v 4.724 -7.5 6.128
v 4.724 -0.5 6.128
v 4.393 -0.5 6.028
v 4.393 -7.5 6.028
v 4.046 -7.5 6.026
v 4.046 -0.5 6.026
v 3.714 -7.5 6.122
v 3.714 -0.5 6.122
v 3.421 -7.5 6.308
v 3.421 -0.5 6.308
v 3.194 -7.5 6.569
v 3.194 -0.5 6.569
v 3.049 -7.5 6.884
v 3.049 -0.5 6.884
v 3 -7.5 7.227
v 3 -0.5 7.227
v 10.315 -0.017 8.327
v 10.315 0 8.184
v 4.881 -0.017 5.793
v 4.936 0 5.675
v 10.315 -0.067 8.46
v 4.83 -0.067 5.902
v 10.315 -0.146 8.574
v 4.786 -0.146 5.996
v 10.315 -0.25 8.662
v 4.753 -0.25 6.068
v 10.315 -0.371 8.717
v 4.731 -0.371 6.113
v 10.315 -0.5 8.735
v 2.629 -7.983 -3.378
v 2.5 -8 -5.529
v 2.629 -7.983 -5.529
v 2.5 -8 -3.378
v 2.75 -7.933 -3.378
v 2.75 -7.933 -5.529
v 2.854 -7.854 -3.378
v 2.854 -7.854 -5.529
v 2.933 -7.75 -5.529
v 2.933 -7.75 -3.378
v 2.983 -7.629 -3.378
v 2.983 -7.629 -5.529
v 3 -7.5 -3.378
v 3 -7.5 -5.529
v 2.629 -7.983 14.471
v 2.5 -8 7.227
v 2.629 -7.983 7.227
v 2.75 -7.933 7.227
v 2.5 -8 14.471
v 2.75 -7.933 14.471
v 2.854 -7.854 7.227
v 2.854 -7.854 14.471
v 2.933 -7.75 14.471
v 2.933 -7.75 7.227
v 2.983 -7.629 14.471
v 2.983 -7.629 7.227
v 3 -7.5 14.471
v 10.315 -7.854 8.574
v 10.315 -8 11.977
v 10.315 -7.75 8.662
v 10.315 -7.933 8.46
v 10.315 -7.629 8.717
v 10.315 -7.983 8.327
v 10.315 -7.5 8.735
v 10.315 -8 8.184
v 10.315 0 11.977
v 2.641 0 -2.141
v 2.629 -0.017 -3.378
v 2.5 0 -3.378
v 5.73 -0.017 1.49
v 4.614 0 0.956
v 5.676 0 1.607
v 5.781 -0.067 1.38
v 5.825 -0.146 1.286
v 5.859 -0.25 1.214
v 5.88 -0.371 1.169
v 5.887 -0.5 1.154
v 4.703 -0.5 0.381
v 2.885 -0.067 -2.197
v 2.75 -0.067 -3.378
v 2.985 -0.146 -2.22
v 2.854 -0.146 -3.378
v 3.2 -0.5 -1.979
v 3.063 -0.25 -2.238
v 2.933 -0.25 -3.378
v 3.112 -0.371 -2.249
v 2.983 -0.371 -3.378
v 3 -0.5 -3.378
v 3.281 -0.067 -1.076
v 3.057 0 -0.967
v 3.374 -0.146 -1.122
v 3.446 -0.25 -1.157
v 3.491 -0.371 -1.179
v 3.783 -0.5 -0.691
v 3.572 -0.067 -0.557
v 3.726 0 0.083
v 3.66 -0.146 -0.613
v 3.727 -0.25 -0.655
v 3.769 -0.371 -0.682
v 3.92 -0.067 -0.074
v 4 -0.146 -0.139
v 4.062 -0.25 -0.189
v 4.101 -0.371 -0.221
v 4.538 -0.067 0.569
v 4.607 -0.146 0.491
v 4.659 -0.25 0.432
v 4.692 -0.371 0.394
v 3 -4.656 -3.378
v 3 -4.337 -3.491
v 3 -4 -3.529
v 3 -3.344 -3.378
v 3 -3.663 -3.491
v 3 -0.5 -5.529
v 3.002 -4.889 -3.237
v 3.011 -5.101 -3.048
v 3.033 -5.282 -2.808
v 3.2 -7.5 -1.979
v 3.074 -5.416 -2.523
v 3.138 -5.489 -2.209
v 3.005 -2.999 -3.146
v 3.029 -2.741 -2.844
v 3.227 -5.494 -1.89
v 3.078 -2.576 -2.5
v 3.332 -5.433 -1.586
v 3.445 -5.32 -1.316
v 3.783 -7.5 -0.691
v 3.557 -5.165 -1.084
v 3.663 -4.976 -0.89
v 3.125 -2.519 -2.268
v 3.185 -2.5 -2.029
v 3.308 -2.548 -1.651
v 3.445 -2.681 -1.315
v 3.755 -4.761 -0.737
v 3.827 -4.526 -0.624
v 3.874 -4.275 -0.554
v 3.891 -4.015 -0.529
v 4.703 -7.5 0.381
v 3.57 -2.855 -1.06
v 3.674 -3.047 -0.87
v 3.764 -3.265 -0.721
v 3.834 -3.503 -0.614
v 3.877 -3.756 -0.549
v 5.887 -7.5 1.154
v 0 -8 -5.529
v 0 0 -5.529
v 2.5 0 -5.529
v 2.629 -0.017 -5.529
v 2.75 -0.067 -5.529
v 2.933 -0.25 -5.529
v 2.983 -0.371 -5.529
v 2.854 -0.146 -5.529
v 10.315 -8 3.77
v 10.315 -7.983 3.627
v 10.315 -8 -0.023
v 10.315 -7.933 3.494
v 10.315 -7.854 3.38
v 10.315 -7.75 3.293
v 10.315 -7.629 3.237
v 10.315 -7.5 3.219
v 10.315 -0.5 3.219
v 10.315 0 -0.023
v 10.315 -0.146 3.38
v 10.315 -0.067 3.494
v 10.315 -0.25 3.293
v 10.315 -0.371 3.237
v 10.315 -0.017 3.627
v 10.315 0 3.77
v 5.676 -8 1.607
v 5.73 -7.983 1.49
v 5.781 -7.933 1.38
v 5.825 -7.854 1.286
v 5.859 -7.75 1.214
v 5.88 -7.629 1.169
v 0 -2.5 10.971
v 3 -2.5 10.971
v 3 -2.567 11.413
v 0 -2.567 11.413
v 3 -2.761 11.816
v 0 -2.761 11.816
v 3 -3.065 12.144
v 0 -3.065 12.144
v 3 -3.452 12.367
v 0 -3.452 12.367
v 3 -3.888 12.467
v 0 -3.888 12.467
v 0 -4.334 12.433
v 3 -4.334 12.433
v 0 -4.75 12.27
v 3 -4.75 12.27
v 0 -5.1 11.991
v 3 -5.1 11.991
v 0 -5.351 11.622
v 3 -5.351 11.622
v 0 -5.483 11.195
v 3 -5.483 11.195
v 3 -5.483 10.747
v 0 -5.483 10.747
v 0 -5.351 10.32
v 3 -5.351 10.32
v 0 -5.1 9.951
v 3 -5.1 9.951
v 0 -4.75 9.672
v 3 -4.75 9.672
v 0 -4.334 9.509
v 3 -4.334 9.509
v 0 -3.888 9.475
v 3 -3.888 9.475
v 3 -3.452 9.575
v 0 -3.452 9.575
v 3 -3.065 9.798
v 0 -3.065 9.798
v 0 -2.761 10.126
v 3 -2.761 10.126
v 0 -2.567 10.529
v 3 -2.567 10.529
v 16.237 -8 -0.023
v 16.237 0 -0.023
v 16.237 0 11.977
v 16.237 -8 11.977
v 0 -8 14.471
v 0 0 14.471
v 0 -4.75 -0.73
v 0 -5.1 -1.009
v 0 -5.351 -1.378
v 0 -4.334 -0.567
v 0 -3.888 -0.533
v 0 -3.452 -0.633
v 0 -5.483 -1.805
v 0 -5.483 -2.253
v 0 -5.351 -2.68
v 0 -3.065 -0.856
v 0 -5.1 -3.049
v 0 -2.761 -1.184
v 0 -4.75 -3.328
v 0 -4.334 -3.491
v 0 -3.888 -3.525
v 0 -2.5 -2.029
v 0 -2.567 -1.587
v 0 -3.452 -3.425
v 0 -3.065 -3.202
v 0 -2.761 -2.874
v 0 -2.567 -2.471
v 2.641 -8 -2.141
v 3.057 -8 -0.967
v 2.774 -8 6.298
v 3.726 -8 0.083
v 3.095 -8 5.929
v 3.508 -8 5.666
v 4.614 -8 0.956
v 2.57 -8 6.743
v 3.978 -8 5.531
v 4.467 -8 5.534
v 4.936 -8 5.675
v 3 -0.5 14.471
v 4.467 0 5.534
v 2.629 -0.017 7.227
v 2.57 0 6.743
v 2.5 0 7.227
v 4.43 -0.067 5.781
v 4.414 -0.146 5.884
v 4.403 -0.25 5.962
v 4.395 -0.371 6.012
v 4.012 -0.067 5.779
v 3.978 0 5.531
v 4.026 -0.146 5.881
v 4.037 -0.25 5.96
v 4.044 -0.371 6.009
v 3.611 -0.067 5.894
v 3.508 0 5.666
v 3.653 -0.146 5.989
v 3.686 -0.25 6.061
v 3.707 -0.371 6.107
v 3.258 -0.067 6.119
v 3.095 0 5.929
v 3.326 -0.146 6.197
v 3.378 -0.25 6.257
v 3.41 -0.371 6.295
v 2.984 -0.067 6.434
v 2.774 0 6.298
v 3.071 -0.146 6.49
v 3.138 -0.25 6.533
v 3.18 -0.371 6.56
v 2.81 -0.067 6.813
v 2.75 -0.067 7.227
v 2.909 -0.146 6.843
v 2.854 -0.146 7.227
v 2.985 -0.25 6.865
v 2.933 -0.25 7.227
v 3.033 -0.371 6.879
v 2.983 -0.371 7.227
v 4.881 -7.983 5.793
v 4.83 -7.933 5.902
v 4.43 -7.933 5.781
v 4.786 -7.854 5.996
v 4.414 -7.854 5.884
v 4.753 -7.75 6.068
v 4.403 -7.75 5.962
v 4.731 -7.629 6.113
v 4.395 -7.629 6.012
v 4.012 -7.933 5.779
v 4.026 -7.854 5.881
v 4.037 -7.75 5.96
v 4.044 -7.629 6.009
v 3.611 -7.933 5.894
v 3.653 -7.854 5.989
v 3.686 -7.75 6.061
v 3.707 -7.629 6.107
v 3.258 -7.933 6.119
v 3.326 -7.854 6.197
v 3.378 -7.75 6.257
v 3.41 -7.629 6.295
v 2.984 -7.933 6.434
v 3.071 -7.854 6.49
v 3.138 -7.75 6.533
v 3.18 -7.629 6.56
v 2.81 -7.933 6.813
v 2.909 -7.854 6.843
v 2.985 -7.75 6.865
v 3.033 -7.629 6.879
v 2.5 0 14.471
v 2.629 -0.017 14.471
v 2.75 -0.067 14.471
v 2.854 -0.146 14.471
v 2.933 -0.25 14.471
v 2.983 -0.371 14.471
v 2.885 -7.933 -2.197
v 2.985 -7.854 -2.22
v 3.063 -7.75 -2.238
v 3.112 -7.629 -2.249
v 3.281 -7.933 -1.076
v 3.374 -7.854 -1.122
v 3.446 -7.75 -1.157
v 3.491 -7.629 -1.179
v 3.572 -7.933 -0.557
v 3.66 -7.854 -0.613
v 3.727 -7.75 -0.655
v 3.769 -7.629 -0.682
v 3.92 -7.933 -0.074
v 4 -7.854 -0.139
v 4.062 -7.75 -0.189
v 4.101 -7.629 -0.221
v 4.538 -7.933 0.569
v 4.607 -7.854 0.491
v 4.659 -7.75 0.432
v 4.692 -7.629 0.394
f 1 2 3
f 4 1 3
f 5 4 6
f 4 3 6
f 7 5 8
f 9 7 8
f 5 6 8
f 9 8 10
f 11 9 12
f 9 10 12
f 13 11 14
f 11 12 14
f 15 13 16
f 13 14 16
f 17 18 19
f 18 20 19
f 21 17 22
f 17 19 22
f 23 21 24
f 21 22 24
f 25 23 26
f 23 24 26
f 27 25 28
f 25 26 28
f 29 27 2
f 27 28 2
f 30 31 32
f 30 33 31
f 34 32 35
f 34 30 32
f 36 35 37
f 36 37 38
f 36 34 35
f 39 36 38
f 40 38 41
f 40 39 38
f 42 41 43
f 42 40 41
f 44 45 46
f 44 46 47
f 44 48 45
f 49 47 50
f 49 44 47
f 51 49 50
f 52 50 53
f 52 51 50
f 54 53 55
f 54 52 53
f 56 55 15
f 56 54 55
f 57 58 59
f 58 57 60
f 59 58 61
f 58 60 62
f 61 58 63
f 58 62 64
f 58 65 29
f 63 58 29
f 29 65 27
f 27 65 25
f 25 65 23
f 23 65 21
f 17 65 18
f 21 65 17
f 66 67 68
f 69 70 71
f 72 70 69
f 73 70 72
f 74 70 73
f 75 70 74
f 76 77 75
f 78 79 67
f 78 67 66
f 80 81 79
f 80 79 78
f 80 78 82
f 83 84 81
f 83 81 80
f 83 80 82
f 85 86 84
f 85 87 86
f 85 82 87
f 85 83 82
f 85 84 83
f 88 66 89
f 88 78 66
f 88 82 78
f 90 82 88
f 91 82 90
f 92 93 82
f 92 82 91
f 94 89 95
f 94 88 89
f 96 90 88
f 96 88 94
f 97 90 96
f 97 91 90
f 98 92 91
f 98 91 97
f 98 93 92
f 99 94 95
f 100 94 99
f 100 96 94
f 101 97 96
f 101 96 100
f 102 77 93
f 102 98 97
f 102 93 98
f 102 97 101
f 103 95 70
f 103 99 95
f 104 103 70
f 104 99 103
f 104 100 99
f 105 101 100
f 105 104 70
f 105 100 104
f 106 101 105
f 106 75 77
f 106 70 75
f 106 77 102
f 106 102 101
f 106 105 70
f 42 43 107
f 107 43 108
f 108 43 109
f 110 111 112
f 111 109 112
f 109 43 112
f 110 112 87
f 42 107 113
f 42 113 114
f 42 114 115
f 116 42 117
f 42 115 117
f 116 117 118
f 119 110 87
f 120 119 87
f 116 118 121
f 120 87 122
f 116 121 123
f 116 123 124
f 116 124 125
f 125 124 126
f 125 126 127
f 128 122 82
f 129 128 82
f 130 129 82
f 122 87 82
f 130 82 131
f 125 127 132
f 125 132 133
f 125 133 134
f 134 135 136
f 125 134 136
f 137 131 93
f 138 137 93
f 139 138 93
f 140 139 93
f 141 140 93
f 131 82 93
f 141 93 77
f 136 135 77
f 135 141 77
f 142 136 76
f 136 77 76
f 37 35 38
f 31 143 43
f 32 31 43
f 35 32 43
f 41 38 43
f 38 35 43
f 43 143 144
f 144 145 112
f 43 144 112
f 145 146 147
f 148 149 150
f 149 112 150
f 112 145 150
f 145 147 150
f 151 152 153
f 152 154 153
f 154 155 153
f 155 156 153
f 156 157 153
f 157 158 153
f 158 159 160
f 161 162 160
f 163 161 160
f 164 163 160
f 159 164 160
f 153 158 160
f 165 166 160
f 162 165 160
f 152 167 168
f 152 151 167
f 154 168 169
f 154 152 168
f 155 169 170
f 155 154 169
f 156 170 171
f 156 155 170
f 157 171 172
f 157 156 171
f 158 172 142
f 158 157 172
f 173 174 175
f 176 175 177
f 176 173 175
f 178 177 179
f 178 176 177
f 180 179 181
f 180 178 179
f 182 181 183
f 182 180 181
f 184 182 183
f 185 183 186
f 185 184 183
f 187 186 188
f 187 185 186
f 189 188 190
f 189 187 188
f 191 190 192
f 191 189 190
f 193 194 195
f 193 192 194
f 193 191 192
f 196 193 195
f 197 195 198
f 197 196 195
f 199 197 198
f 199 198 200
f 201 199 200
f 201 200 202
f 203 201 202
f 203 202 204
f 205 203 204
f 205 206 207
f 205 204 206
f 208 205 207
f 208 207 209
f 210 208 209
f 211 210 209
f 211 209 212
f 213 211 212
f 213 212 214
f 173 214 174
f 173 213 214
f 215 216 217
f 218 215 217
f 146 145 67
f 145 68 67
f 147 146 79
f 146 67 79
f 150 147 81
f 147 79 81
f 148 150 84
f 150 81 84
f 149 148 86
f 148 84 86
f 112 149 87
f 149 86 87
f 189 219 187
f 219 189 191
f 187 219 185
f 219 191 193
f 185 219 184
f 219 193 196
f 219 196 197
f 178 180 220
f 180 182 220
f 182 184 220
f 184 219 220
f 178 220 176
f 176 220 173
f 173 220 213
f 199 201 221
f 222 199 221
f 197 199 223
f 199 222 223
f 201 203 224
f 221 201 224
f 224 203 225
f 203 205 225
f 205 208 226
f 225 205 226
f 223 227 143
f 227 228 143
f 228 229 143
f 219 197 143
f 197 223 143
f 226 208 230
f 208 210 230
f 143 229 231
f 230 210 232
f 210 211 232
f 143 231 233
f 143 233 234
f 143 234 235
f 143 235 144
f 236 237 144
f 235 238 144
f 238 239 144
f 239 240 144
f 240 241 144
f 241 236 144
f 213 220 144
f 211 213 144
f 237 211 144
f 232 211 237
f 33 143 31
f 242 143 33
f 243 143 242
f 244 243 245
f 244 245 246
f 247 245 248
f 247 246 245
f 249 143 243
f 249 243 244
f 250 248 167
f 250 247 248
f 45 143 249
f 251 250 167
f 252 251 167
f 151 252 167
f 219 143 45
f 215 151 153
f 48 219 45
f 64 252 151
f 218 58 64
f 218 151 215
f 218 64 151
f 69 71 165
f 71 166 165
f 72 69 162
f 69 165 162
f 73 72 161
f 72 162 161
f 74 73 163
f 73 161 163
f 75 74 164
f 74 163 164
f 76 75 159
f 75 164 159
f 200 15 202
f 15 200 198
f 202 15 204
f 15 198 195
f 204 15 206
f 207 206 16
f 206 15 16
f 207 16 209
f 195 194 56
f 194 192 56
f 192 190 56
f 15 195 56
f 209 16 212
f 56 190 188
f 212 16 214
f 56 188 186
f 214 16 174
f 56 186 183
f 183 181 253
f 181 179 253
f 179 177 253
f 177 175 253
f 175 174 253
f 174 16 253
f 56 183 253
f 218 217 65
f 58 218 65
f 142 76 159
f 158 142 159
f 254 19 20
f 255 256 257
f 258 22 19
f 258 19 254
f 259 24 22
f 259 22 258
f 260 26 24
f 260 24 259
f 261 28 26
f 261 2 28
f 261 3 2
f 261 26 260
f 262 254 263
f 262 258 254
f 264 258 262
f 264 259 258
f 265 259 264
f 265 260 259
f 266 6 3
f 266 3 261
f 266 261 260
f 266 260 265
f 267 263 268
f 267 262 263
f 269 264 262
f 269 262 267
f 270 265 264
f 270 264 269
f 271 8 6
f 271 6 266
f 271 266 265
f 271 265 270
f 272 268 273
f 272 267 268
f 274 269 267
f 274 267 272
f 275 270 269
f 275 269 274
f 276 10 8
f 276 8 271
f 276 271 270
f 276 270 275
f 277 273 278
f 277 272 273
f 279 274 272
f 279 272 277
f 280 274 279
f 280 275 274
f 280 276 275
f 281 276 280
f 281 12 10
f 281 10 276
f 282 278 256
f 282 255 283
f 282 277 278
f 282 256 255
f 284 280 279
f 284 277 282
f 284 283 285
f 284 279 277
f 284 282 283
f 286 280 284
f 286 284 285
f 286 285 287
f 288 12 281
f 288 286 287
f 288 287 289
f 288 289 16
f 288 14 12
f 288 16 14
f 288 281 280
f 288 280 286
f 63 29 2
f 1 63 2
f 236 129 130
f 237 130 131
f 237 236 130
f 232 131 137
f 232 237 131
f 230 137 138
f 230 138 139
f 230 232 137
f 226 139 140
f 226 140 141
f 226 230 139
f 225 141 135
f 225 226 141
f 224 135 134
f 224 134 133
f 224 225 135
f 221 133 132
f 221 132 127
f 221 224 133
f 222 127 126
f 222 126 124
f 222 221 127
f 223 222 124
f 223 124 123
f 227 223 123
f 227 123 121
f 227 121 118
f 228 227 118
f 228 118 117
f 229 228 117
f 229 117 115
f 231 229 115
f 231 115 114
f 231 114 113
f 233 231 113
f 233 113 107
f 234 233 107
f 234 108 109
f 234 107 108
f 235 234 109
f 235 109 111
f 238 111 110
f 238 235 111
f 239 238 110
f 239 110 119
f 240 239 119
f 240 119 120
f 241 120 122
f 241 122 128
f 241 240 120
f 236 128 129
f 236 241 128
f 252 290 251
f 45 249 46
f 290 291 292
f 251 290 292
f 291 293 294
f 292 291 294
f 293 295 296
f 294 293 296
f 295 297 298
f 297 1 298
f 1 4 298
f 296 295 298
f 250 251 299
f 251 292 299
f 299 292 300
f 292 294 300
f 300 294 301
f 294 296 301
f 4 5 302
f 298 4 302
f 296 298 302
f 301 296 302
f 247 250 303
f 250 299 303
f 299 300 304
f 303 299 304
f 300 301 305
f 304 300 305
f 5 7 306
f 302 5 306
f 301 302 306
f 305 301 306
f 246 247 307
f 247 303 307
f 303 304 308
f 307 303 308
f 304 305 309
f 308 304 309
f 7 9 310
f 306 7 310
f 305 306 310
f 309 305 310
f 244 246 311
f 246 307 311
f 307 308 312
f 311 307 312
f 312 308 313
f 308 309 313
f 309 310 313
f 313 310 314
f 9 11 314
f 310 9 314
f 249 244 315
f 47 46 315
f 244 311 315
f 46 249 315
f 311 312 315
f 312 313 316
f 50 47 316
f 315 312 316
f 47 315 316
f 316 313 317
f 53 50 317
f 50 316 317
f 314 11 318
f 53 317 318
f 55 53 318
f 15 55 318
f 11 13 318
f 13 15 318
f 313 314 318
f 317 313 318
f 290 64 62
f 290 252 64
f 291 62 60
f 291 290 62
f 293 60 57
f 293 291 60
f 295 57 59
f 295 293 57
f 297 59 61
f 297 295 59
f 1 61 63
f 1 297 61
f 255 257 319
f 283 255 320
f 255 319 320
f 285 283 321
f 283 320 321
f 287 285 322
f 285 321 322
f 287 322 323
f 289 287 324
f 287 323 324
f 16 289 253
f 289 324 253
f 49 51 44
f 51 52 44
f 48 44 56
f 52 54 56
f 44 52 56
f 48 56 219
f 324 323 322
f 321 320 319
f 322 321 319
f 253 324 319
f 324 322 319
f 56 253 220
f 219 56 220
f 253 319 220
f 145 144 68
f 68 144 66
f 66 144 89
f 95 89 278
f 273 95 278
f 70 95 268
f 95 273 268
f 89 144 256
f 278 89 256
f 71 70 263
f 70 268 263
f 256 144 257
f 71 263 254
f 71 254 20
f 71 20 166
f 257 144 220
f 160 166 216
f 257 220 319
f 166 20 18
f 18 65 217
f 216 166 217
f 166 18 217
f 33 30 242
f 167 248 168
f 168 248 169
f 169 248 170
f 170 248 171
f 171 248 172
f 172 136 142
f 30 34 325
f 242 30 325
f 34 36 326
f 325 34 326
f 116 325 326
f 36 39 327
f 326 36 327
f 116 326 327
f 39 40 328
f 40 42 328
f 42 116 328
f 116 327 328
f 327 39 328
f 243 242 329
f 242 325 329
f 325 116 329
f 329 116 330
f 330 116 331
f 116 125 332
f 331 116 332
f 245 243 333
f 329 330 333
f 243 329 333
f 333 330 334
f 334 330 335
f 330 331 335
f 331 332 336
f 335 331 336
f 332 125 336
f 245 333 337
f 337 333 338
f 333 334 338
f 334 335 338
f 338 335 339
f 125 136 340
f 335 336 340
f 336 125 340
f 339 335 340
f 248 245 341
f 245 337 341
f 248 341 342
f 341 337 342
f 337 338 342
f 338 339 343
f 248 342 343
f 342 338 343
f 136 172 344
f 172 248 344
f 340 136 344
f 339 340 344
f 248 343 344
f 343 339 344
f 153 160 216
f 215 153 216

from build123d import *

# Parameters (mm, degrees)
F1_DEPTH = 8
F2_R     = 1.5
F3_DEPTH = 3.8920101006
F4_R     = 0.5


with BuildPart() as f1:
    # F0 (on Front) → F1 (new body)
    with BuildSketch(Plane.XZ):
        with BuildLine():
            Line((3, 14.471053486), (0, 14.471053486))
            Line((0, 14.471053486), (0, -5.528946514))
            Line((0, -5.528946514), (3, -5.528946514))
            Line((3, -5.528946514), (3, -3.3778412531))
            ThreePointArc((3, -3.3778412531), (3.7830427709, -0.6913432113), (5.8869086913, 1.1536976821))
            Line((5.8869086913, 1.1536976821), (10.3150881731, 3.2185916862))
            Line((10.3150881731, 3.2185916862), (10.3150881731, -0.0229635164))
            Line((10.3150881731, -0.0229635164), (16.2366852164, -0.0229635164))
            Line((16.2366852164, -0.0229635164), (16.2366852164, 11.9770364836))
            Line((16.2366852164, 11.9770364836), (10.3150881731, 11.9770364836))
            Line((10.3150881731, 11.9770364836), (10.3150881731, 8.735481281))
            Line((10.3150881731, 8.735481281), (4.7242360053, 6.1284240995))
            ThreePointArc((4.7242360053, 6.1284240995), (3.5608002487, 6.2046797078), (3, 7.2268835811))
            Line((3, 7.2268835811), (3, 14.471053486))
        make_face()
    extrude(amount=F1_DEPTH)

    # F2 (on Right) → F3 (cut, through all)
    with BuildSketch(Plane.YZ):
        with Locations((-4, -2.028946514)):
            Circle(F2_R)
        with Locations((-4, 10.971053486)):
            Circle(F2_R)
    extrude(amount=F3_DEPTH, mode=Mode.SUBTRACT)

    # F4
    f4_edges = [f1.edges().sort_by_distance(p)[0] for p in [
        (7.519662, 0, 7.431953),
        (8.100998, 0, 2.186145),
        (7.519662, -8, 7.431953),
        (8.100998, -8, 2.186145),
    ]]
    fillet(f4_edges, radius=F4_R)


solid = f1.part
